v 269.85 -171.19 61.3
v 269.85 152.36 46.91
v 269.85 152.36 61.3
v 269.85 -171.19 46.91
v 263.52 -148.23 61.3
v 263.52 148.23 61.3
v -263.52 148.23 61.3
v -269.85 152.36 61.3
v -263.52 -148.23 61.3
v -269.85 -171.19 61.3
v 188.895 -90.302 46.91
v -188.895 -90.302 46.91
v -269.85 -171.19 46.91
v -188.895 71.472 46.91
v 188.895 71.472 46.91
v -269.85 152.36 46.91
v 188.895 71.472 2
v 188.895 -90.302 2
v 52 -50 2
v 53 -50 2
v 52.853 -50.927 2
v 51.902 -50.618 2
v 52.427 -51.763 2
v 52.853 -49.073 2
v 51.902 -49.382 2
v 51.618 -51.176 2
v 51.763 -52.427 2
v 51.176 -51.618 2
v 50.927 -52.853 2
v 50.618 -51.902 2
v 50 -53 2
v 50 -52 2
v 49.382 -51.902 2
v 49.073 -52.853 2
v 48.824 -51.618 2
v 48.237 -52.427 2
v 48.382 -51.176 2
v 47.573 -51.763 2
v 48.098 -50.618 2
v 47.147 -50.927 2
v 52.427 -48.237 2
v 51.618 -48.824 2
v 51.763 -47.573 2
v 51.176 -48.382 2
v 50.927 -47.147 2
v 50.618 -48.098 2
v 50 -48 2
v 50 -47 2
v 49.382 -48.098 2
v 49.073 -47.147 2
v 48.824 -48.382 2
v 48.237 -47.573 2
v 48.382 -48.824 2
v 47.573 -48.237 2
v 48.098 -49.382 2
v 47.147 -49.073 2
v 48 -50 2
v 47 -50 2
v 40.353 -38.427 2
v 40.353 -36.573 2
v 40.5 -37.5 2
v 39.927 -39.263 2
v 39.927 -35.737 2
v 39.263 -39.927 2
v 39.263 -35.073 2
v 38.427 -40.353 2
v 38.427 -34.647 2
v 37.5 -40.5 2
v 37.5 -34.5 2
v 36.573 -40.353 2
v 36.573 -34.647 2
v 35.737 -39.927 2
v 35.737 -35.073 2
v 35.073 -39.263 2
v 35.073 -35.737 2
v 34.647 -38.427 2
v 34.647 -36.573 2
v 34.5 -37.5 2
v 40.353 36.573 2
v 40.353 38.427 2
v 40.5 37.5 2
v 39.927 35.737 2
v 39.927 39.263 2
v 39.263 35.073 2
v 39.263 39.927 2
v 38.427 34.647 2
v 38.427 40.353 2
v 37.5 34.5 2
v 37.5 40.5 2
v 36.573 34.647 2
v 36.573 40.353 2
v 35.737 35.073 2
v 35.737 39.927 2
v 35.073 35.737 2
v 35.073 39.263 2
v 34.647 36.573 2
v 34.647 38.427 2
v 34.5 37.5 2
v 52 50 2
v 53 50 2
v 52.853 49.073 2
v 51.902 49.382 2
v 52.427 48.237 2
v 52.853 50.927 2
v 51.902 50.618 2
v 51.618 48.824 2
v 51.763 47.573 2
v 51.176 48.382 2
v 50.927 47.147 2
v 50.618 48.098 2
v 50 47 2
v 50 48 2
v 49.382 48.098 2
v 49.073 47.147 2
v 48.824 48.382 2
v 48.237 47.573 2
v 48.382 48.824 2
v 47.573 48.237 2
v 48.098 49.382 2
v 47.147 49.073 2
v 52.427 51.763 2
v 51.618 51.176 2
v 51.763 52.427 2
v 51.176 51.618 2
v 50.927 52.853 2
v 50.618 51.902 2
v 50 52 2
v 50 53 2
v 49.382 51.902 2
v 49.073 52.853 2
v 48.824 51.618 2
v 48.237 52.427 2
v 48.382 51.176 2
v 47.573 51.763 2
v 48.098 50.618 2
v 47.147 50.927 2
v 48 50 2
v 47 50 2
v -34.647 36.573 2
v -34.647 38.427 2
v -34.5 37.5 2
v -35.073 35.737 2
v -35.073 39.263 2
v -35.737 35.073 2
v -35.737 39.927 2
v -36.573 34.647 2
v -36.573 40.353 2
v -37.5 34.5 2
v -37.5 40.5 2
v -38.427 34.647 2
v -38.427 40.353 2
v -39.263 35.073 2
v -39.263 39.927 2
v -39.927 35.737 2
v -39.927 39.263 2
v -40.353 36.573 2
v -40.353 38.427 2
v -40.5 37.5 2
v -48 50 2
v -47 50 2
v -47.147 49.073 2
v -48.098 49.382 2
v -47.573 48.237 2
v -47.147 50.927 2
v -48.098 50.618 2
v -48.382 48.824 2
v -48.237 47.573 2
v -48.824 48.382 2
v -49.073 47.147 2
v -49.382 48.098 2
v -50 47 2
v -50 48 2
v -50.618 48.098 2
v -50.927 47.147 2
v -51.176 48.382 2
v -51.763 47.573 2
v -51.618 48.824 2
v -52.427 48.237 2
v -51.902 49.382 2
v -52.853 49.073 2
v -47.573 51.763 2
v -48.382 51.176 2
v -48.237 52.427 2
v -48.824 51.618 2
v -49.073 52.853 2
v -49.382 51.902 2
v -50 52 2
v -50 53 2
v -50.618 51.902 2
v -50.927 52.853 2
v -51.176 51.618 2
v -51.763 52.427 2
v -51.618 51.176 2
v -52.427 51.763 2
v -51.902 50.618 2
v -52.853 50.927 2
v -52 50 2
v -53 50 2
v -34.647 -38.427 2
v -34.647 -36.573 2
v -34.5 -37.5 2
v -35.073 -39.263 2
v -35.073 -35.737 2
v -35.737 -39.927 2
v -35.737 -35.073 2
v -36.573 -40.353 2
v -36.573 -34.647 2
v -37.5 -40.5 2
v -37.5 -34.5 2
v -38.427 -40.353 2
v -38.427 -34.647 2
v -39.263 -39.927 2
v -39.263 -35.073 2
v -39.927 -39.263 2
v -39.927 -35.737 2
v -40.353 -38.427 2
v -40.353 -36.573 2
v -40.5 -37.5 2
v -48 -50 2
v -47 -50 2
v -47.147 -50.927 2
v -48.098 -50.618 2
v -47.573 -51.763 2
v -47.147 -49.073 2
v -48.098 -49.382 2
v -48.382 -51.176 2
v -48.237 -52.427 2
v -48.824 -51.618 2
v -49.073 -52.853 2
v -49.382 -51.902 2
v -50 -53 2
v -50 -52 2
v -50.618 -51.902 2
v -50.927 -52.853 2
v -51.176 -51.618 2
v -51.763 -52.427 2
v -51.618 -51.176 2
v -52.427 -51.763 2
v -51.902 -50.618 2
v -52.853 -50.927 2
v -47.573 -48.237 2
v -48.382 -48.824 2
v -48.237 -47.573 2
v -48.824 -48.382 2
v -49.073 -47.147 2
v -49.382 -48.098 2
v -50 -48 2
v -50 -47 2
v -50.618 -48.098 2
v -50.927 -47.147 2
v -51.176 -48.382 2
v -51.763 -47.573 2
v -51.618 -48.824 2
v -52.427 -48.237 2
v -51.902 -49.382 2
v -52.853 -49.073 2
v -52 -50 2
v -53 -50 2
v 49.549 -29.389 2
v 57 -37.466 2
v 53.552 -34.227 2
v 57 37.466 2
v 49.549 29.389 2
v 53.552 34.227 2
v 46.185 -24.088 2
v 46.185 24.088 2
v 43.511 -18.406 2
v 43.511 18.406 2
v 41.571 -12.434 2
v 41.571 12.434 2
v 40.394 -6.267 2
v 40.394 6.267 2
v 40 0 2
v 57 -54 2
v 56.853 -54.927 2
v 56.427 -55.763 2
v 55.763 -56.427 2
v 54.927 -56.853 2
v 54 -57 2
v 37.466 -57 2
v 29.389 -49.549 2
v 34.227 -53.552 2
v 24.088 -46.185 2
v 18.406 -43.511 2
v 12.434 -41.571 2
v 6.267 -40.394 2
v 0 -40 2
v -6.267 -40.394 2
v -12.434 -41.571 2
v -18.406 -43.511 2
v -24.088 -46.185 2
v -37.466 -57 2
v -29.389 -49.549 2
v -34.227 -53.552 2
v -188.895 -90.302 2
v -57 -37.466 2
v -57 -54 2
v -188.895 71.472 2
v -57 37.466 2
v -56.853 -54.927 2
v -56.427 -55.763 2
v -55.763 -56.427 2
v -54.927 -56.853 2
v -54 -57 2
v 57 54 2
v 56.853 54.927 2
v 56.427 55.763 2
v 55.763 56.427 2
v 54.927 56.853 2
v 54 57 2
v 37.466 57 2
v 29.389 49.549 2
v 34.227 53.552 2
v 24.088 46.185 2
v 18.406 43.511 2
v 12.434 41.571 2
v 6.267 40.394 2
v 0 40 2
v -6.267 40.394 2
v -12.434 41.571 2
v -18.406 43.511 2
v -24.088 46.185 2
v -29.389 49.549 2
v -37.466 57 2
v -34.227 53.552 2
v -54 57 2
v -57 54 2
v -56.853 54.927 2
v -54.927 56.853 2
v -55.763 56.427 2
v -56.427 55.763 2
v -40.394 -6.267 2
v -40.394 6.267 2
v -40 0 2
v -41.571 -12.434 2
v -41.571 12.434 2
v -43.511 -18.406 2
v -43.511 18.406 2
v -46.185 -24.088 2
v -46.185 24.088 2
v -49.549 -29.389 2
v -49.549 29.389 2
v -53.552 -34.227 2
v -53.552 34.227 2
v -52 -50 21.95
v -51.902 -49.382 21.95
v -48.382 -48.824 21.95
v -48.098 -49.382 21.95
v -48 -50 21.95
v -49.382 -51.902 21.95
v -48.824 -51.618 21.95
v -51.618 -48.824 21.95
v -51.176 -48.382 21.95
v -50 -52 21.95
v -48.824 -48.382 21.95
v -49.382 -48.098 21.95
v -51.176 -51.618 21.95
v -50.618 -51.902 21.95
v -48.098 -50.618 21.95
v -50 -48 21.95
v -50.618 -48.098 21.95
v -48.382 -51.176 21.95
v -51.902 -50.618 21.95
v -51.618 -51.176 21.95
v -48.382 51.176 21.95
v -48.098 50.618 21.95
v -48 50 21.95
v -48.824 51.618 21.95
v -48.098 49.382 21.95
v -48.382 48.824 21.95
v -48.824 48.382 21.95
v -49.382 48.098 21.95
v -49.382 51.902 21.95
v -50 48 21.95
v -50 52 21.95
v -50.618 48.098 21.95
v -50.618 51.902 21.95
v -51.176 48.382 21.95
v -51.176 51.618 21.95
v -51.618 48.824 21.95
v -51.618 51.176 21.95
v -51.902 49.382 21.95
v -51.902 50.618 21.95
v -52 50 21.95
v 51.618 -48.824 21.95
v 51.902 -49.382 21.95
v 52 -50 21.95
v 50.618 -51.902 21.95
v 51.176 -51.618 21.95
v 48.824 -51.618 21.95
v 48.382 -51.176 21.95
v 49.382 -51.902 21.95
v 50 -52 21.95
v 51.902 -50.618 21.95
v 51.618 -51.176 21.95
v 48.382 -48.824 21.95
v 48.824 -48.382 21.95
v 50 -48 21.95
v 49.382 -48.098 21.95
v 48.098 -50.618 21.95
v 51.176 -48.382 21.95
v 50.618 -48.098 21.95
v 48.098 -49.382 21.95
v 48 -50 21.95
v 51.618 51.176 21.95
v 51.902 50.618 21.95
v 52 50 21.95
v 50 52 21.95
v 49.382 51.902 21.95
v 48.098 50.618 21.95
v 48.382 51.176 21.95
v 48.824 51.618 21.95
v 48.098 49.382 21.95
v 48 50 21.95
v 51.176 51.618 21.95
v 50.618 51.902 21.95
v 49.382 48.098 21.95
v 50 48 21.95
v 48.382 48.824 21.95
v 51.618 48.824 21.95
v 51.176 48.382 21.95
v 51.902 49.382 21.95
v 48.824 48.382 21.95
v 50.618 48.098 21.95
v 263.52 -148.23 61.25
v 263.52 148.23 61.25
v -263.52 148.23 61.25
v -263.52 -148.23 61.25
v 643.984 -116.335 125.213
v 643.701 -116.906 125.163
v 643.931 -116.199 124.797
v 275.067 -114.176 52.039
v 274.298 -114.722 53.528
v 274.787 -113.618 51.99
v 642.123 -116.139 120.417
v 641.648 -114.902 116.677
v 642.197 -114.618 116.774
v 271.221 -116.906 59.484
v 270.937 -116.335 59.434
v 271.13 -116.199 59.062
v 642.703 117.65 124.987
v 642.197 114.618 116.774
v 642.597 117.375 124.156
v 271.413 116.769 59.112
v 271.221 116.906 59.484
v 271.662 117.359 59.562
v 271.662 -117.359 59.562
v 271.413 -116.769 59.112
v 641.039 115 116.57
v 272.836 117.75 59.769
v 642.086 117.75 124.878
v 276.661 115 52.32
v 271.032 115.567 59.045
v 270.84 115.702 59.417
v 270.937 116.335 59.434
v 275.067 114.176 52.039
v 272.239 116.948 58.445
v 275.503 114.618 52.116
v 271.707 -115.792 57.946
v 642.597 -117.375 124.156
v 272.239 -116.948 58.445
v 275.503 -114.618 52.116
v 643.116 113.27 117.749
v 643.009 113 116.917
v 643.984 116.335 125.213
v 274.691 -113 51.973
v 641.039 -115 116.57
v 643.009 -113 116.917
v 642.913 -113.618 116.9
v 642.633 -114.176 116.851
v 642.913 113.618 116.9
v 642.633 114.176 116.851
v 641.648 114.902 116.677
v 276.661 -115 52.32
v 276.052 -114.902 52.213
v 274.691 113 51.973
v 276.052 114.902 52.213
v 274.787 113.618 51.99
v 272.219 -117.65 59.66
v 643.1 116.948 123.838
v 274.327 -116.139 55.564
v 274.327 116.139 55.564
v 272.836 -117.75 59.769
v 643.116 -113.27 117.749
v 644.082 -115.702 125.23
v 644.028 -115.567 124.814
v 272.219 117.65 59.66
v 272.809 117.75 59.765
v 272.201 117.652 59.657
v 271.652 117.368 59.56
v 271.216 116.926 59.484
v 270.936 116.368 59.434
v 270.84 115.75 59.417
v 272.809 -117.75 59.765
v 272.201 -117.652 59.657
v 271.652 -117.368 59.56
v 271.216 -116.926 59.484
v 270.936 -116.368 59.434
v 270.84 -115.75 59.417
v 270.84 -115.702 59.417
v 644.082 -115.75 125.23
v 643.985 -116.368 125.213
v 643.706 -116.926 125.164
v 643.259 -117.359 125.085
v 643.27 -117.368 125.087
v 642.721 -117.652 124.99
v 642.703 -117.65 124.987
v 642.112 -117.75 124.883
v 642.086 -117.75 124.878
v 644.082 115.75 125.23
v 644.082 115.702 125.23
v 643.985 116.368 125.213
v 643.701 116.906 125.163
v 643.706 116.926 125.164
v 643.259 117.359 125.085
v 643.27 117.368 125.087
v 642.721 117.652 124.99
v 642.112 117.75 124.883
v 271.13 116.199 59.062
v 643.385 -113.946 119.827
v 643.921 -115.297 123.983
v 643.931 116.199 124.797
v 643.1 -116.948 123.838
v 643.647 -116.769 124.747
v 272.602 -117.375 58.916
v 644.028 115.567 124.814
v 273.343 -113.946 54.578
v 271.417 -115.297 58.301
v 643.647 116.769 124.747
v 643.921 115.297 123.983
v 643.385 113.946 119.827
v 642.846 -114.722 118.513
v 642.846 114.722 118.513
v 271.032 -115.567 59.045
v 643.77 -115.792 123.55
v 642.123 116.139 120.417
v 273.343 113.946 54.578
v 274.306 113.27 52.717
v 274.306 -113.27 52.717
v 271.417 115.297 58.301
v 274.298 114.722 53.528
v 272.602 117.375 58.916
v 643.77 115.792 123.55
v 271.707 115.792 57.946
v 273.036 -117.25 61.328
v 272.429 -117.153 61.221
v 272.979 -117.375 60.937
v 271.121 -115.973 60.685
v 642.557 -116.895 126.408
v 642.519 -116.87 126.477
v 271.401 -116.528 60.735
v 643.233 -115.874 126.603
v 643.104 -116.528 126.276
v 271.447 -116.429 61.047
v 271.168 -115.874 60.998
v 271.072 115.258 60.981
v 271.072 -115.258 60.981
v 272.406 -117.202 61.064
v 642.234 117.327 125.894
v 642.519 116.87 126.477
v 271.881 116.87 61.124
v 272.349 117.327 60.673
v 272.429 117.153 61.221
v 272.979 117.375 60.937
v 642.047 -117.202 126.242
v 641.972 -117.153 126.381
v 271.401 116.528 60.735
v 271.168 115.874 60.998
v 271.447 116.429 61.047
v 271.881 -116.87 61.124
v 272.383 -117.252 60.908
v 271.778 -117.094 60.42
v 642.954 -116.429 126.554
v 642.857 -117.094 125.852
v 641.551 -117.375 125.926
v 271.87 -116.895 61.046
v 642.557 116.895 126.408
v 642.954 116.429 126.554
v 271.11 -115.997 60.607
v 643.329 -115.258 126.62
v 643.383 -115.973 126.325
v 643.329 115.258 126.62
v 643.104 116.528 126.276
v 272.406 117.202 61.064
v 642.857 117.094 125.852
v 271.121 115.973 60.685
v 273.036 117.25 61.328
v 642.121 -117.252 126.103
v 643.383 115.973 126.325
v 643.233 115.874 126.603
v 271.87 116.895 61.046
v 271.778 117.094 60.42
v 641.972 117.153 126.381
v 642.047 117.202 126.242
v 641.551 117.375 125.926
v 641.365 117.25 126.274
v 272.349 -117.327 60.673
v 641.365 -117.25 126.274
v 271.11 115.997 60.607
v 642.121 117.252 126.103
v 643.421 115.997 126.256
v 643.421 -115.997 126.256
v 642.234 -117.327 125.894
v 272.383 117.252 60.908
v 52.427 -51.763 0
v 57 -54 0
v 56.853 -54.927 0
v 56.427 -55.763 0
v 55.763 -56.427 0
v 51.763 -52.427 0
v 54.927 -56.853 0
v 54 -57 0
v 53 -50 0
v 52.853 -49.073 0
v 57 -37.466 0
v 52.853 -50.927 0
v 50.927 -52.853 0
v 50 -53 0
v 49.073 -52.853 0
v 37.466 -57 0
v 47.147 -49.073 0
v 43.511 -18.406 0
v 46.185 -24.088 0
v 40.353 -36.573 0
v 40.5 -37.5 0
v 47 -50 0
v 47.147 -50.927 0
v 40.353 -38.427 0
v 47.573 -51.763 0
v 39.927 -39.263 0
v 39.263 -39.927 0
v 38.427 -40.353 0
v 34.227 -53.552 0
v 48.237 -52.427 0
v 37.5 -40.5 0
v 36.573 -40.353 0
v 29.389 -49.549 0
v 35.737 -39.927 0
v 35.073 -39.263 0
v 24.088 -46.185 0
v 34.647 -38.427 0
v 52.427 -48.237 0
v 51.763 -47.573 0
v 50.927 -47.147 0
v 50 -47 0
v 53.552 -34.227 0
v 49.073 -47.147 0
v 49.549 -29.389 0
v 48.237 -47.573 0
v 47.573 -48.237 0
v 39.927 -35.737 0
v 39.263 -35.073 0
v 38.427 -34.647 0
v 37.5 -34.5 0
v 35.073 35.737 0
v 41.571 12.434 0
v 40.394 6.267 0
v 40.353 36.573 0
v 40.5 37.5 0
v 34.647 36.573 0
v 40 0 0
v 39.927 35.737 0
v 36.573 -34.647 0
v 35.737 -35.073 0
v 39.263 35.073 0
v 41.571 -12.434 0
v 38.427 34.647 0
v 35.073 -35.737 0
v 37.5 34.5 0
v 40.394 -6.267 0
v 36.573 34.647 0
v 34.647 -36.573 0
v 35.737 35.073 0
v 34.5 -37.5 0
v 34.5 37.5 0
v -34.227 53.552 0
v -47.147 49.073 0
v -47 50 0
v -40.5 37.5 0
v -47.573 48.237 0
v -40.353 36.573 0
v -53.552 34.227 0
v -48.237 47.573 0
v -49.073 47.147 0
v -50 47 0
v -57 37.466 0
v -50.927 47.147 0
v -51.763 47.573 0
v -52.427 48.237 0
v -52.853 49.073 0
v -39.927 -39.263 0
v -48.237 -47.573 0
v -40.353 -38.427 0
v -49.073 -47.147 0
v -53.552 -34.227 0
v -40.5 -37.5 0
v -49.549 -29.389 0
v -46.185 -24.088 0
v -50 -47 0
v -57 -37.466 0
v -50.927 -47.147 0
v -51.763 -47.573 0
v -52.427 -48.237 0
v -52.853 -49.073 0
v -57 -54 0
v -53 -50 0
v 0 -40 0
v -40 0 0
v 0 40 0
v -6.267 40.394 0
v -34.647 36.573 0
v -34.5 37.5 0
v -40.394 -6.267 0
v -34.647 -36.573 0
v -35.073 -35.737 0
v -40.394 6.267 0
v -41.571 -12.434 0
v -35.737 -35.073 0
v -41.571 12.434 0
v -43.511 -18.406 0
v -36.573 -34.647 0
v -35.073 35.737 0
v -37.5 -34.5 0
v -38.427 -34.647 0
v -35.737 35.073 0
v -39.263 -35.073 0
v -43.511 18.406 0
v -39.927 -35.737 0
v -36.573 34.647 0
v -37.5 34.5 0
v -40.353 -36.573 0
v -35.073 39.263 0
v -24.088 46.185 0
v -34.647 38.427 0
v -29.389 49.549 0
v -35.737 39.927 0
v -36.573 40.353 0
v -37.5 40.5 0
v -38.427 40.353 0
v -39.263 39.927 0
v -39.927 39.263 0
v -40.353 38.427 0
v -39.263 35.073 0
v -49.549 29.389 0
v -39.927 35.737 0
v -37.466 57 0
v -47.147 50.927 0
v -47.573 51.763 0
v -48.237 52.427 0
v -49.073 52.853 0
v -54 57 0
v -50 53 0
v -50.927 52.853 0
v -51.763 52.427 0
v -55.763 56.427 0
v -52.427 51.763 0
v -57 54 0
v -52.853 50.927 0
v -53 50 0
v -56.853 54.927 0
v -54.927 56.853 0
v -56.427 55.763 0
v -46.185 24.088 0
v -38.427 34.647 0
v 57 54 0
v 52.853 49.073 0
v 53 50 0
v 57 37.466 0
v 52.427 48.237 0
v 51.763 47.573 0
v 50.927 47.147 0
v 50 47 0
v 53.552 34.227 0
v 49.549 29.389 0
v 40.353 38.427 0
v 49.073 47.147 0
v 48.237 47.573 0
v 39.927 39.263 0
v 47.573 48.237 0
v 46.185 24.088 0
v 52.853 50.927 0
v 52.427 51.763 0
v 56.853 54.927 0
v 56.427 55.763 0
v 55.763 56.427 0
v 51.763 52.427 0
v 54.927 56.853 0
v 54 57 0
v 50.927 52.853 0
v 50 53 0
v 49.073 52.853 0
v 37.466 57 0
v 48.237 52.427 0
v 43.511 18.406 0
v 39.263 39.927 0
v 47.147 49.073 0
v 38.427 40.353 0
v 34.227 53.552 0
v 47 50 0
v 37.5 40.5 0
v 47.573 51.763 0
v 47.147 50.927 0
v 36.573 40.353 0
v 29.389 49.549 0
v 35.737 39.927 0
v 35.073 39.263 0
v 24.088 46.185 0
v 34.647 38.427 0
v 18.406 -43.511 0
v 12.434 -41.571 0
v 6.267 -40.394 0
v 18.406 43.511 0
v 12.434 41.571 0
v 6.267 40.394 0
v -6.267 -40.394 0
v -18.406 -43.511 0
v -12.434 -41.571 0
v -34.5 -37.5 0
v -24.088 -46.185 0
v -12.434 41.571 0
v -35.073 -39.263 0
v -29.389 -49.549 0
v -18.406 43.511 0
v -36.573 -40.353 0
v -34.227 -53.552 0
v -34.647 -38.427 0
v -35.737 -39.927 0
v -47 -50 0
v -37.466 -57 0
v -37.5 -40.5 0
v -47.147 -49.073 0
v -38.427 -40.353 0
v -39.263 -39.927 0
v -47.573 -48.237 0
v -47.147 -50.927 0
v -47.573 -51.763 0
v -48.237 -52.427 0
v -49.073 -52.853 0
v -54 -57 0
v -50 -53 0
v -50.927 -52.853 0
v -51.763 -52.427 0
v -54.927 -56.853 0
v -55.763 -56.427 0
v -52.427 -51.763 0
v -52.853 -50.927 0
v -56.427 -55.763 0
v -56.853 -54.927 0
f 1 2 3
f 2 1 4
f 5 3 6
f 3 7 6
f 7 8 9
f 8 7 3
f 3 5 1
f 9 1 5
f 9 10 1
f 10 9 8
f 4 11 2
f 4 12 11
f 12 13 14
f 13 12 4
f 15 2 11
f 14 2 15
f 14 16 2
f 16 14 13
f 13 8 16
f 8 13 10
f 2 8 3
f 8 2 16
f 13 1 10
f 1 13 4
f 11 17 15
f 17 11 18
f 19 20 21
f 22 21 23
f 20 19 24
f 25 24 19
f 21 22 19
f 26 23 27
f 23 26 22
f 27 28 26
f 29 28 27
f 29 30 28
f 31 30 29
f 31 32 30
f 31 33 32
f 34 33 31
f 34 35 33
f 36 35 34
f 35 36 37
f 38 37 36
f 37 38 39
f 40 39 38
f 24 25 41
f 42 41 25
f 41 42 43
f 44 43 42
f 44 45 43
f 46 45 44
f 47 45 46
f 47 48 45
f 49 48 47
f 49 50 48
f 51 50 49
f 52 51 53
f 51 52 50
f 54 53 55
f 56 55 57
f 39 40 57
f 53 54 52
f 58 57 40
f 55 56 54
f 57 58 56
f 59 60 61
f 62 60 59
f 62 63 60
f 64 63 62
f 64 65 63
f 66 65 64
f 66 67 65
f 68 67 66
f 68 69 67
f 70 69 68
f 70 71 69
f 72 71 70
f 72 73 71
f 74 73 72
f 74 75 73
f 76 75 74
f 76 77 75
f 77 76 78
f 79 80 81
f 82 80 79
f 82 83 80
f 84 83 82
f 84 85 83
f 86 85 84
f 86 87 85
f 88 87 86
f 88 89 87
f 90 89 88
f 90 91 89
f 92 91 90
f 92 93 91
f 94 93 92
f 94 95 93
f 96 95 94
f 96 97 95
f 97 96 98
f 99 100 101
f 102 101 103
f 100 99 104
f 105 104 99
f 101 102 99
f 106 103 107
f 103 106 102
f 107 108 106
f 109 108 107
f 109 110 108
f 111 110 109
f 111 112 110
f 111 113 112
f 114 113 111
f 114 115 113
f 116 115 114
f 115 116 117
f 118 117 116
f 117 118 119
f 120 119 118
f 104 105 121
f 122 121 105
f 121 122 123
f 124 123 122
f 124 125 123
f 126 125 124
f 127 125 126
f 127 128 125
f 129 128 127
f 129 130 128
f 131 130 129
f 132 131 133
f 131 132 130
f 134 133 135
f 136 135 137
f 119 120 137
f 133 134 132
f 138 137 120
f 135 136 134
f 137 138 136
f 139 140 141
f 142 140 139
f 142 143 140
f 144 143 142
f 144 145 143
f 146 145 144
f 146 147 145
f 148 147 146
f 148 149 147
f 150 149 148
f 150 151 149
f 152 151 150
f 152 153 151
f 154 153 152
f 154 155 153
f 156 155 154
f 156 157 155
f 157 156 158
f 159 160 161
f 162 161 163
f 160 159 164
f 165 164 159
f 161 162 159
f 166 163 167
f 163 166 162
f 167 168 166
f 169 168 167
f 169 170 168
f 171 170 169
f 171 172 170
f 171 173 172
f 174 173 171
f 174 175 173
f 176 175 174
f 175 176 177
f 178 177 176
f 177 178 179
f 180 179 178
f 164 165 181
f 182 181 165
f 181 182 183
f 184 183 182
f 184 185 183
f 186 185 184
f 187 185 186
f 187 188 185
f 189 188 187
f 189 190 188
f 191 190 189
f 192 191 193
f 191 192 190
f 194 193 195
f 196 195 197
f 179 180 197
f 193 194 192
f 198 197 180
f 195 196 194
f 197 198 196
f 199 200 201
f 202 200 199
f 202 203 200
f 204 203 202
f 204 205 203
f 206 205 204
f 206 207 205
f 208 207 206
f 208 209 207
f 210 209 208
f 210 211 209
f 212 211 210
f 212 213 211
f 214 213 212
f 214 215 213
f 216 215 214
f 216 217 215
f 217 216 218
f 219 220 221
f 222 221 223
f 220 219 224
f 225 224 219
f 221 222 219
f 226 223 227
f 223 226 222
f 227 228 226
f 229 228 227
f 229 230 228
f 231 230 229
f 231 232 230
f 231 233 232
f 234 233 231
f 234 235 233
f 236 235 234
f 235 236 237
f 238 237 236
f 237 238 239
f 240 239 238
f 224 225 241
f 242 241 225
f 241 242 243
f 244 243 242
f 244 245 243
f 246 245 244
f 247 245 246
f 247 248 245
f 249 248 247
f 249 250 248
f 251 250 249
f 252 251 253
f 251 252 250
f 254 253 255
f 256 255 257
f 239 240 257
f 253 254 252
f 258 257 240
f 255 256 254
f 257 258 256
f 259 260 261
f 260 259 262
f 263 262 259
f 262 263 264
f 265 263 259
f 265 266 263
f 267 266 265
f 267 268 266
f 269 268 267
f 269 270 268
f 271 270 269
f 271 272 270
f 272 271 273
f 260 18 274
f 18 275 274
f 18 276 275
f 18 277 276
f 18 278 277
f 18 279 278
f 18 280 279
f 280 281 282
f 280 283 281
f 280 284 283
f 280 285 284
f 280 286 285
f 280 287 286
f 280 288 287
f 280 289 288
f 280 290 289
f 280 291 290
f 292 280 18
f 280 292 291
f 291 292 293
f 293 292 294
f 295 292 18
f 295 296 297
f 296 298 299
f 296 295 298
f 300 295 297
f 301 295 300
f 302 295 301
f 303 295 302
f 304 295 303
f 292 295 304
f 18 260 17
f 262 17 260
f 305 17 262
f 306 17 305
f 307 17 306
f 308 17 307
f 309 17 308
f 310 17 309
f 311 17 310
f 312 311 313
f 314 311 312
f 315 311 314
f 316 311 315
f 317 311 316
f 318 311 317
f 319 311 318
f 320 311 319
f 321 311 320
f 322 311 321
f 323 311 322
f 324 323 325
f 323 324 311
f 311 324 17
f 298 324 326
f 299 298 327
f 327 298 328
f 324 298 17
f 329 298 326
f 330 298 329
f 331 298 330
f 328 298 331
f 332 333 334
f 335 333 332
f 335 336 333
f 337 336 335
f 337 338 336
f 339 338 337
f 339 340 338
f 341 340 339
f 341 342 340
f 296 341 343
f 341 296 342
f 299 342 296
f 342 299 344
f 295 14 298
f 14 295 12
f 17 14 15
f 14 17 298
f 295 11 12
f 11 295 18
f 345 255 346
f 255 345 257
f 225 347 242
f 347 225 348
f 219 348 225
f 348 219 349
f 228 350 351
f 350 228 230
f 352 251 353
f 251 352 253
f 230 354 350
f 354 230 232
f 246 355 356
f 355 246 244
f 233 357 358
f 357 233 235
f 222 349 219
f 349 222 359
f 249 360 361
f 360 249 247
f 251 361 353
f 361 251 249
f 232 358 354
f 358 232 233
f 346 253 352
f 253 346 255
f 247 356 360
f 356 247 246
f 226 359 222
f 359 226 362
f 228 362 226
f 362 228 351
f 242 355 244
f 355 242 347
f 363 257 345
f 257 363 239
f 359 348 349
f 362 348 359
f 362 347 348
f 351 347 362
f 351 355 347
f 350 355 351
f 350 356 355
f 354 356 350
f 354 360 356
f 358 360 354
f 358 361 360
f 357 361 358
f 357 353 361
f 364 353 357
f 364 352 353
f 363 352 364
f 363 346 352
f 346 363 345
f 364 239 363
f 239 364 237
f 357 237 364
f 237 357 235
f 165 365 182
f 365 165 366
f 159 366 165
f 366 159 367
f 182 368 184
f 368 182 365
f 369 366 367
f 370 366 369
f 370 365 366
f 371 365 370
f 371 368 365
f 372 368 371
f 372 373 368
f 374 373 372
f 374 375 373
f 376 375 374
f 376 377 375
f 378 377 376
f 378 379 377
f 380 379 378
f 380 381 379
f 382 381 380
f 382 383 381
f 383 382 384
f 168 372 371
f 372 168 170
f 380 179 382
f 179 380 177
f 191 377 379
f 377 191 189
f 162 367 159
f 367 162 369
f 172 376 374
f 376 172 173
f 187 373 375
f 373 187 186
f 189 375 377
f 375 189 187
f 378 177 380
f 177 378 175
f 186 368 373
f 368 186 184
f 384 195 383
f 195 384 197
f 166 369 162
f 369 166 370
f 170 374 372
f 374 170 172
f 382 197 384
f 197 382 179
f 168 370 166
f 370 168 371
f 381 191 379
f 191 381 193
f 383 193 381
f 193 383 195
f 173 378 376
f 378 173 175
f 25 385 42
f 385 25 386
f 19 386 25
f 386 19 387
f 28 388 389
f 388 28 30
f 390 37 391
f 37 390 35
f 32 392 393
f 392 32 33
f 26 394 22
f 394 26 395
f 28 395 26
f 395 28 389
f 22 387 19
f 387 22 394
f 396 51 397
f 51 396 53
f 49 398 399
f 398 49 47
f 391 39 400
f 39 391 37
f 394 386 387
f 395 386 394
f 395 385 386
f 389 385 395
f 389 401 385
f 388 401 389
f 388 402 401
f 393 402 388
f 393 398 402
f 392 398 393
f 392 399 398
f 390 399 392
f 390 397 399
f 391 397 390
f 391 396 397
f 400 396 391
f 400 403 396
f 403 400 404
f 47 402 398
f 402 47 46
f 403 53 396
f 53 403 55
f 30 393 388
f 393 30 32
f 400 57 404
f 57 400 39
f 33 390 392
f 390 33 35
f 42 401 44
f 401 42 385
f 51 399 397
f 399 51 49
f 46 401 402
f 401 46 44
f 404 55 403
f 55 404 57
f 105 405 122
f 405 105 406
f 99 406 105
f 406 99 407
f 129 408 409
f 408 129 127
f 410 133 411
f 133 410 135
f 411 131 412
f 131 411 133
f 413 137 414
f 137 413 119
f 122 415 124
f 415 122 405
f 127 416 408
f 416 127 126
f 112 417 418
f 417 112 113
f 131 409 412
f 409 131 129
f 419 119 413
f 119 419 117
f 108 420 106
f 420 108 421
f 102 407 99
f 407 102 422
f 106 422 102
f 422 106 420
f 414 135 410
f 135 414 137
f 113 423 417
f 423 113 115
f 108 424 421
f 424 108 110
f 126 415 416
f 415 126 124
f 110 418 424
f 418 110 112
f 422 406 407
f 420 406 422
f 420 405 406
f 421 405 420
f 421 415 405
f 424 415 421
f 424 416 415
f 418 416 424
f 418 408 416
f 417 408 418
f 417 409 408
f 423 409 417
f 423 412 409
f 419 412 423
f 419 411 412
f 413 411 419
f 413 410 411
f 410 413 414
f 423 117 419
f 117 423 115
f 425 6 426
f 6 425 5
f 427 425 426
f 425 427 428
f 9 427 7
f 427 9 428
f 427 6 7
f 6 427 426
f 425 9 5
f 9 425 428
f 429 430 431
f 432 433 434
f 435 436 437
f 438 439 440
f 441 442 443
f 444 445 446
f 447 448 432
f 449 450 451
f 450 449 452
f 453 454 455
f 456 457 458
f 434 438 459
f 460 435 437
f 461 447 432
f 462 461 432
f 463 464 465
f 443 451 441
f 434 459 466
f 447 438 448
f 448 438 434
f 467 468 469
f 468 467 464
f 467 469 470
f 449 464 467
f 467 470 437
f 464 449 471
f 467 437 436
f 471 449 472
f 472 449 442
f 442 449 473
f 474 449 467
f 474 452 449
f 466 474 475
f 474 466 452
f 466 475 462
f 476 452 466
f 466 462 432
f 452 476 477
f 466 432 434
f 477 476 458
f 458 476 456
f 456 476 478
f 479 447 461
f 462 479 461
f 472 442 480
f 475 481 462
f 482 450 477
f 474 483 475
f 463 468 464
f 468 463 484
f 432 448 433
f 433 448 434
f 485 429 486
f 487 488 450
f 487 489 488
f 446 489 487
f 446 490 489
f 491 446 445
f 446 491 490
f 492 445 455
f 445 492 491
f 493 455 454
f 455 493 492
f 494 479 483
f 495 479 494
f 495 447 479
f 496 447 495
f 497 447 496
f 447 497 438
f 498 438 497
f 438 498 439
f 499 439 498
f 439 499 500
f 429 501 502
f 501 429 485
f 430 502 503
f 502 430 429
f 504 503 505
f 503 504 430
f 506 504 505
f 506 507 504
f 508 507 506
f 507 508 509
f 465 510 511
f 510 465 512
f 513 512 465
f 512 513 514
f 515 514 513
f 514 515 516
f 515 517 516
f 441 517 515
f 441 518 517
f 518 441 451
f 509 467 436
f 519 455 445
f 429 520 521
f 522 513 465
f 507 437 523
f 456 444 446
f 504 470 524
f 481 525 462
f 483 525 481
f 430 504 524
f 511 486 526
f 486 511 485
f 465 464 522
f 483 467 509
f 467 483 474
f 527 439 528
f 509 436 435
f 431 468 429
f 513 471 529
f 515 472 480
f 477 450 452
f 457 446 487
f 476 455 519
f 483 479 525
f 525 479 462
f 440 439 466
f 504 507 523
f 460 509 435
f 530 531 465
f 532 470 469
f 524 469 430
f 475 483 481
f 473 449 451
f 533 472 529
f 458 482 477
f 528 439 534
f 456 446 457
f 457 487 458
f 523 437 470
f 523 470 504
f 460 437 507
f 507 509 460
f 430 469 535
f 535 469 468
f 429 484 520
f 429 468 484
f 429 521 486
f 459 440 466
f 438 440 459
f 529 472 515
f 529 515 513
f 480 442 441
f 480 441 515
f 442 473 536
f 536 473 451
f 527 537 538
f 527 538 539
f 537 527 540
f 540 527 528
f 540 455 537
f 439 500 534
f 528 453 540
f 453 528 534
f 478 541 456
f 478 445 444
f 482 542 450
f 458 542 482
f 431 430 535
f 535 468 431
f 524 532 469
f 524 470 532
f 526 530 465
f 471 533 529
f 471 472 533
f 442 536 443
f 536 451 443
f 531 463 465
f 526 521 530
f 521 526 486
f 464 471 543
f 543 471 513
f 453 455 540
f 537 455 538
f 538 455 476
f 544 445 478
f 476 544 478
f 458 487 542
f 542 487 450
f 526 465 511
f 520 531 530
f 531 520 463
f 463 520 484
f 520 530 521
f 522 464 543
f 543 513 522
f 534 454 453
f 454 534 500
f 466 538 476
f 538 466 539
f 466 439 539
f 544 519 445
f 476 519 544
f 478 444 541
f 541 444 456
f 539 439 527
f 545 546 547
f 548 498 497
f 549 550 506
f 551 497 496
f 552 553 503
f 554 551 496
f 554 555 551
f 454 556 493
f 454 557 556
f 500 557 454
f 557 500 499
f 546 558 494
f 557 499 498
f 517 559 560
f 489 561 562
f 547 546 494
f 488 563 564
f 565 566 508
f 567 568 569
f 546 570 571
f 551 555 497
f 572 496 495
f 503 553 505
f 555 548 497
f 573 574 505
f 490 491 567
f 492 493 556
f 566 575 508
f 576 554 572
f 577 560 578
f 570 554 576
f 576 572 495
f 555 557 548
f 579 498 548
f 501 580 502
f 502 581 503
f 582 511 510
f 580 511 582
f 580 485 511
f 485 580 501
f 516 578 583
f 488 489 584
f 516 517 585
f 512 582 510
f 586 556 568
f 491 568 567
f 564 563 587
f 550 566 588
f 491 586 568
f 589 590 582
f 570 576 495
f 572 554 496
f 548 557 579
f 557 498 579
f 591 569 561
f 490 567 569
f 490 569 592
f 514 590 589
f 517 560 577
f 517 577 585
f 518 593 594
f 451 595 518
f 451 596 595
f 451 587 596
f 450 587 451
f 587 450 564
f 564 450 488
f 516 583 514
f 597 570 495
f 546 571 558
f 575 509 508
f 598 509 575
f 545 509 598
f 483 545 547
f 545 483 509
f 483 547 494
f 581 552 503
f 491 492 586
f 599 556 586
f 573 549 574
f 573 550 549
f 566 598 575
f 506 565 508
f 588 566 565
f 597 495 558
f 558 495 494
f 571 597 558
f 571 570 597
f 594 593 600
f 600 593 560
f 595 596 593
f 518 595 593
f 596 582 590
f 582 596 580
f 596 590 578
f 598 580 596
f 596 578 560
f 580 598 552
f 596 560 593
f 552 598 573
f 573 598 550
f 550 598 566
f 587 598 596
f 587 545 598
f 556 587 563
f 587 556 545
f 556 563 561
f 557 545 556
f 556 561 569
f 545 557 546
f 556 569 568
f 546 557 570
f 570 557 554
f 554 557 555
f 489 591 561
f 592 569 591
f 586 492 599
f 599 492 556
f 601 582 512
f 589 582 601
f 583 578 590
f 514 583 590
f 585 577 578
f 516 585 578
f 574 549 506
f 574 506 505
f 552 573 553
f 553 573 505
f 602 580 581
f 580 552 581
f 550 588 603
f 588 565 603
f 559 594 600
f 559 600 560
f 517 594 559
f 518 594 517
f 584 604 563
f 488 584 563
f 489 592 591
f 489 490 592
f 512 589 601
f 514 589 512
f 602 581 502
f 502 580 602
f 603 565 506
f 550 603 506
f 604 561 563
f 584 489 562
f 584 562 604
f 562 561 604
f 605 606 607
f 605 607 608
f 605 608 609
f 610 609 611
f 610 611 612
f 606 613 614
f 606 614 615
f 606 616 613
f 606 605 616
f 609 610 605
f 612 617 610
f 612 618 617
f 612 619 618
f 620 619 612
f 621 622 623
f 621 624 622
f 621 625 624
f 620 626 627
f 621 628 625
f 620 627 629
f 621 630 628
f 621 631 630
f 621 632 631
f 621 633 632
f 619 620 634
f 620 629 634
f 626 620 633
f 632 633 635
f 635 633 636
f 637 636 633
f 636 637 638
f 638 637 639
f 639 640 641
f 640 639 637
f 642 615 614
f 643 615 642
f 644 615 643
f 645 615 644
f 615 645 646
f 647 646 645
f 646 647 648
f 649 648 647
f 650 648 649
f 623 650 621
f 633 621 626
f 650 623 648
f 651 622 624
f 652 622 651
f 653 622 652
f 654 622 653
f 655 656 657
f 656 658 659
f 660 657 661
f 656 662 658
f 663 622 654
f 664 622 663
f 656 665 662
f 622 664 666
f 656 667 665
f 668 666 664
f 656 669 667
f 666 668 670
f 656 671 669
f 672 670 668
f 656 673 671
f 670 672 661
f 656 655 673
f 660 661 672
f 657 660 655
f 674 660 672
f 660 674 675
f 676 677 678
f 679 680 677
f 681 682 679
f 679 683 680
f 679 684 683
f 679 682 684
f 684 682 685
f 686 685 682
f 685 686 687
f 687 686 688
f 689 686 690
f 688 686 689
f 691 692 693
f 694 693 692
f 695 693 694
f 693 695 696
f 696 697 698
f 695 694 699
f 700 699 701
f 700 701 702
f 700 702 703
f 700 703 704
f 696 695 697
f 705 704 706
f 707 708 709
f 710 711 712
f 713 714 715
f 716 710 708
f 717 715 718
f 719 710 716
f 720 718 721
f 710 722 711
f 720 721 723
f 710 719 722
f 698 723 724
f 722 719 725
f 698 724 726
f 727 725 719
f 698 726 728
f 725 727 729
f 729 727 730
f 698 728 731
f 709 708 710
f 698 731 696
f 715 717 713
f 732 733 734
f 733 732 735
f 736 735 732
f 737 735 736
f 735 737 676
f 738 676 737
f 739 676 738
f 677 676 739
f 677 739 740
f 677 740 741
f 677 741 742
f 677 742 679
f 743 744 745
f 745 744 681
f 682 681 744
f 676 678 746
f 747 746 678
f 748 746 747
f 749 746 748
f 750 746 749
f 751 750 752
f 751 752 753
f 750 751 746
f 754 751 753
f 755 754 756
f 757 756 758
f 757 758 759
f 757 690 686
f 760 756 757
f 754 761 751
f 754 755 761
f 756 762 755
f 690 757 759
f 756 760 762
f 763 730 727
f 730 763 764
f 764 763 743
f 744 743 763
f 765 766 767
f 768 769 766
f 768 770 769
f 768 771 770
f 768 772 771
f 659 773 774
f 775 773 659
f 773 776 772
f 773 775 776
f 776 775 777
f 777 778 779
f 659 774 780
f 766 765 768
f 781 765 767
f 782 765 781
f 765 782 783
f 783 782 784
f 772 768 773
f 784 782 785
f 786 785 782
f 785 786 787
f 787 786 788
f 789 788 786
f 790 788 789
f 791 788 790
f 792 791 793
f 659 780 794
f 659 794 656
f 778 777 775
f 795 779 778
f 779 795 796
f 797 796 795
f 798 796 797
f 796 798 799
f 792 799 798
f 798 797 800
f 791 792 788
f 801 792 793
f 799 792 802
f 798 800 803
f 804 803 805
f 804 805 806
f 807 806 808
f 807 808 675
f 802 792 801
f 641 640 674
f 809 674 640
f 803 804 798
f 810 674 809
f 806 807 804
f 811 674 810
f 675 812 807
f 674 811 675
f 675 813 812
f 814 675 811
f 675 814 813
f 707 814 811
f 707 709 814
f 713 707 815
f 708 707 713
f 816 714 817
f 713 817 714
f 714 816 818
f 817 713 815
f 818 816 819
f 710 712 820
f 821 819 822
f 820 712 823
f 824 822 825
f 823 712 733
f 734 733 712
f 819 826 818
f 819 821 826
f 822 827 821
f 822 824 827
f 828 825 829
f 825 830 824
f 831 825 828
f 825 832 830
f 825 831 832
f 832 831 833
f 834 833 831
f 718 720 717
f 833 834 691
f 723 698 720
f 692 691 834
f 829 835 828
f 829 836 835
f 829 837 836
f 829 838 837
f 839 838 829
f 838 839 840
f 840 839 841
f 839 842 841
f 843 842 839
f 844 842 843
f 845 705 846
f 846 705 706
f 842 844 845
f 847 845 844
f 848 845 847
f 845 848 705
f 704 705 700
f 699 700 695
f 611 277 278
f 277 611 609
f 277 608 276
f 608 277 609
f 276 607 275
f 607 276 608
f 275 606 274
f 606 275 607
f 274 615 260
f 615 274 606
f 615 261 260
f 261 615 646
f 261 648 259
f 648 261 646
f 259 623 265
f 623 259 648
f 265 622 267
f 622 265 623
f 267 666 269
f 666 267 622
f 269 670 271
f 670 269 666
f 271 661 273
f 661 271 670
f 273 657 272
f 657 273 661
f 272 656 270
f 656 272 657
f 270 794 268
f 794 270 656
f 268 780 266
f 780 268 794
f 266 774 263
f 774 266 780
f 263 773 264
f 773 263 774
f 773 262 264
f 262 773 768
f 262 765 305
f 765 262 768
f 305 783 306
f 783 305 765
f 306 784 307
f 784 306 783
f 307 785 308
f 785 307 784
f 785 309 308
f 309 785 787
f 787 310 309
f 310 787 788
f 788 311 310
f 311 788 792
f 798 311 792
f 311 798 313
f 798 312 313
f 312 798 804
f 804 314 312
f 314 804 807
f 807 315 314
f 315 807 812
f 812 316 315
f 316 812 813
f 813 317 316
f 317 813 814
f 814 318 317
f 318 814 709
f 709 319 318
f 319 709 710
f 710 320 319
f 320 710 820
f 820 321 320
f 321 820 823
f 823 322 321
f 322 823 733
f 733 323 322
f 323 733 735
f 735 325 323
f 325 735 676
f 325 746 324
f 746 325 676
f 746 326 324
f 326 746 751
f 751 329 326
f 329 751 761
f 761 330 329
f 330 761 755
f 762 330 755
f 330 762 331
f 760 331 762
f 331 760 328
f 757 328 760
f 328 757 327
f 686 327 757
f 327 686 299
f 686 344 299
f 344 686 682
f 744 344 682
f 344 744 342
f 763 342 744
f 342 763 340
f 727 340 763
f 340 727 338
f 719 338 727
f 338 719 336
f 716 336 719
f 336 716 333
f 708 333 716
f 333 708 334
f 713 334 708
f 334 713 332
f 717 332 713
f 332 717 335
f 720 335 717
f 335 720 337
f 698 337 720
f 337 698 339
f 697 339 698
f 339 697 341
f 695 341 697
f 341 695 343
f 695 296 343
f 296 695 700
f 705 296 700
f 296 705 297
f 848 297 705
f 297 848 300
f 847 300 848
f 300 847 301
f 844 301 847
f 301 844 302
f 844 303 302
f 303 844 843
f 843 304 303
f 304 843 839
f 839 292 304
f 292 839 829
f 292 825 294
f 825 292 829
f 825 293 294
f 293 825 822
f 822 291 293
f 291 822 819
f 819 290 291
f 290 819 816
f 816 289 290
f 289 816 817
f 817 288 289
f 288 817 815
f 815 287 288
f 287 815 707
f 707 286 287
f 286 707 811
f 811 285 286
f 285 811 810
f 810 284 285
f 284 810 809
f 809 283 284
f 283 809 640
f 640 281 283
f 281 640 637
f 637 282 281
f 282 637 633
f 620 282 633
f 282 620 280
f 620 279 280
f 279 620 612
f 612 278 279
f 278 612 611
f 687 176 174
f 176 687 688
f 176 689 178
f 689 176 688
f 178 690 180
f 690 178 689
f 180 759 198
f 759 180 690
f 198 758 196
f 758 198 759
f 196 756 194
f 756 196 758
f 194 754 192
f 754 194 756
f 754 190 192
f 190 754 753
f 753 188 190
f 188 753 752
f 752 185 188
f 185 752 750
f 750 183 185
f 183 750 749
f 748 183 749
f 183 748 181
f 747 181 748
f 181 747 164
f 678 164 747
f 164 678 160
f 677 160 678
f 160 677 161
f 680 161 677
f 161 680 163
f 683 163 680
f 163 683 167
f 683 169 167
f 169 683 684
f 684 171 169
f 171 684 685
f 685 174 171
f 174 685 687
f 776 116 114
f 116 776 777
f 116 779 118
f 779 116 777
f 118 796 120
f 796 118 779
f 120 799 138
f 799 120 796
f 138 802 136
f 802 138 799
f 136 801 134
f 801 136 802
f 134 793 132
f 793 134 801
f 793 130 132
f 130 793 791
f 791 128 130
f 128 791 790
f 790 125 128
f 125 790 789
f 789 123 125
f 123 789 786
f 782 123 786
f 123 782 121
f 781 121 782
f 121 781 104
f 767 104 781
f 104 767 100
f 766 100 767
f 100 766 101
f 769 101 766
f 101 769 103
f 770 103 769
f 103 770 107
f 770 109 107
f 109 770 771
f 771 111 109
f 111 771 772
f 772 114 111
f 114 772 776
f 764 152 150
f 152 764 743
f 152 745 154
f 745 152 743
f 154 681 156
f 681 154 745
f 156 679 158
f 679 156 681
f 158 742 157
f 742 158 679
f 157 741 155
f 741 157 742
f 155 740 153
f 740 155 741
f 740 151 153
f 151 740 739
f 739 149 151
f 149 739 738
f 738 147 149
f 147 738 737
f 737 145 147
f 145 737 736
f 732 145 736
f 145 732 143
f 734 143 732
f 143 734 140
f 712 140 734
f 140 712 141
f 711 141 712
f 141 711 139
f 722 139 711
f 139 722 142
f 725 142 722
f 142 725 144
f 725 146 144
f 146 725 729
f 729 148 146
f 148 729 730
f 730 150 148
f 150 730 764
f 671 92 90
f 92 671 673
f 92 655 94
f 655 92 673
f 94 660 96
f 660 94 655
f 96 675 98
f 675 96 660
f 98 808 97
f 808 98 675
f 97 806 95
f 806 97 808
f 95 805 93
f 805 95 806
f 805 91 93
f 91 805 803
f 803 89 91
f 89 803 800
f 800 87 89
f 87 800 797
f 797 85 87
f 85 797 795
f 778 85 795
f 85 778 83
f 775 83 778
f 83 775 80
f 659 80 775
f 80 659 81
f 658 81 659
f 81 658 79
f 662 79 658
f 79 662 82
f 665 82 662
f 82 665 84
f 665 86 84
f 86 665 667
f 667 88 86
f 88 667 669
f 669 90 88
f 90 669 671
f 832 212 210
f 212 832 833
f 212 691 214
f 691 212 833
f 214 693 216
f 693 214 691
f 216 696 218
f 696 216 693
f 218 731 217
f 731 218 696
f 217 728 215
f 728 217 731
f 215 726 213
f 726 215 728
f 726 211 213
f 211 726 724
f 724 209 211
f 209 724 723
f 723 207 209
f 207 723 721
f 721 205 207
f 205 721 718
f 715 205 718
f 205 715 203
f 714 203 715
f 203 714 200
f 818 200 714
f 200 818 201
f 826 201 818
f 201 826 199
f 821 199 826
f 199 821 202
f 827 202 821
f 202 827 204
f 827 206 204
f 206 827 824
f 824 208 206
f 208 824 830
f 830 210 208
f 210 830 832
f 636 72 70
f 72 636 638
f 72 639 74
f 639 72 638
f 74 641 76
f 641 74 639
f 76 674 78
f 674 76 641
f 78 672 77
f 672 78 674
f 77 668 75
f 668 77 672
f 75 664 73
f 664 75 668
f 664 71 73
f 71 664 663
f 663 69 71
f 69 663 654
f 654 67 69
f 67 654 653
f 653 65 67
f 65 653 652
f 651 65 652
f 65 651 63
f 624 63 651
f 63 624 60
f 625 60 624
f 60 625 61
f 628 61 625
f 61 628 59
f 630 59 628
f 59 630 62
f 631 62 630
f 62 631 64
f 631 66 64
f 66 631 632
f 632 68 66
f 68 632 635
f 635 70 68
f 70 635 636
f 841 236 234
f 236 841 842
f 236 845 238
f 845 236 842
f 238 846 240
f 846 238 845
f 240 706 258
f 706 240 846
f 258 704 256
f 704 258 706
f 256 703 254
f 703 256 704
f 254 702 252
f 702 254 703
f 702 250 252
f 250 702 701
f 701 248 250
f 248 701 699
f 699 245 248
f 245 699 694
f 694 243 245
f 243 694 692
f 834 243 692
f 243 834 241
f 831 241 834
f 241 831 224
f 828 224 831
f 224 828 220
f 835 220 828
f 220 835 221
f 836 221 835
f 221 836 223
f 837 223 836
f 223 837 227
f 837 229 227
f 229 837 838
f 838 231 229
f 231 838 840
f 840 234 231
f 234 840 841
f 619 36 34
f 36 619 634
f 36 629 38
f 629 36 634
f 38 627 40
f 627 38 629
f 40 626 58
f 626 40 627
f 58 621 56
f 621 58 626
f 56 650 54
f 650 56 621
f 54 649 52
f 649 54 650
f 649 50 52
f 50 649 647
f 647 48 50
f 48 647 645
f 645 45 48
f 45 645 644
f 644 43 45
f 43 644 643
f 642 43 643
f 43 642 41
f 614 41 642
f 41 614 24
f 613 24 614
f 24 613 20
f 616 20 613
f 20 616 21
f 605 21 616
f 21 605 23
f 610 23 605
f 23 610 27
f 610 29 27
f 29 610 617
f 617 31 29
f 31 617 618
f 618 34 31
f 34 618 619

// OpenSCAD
$fn=20;

/* [Dimensions] */
extrusionWidth=0.4;
walls=4;
maxThickness=14;

/* [Hidden] */
minWallThck=extrusionWidth*walls;
fudge=0.1;

VESAAdapter();
translate([0,0,2]) asusVA24D();
translate([270,0,61.3]) rotate([0,-10,0]) translate([190,0,-10]) USBMon();

module VESAAdapter(){
  plateDims=[120,120,2];
  drillDia=6;
  rad=6;
  cutOutRad=50;
  cutOutDist=cutOutRad*2+80; //distance between cutout circles
  
  linear_extrude(plateDims.z) difference(){
    hull() for (ix=[-1,1],iy=[-1,1])
      translate([ix*(plateDims.x/2-rad),iy*(plateDims.y/2-rad)]) circle(d=drillDia);
    for (ix=[-1,1],iy=[-1,1]){
      translate([ix*100/2,iy*100/2]) circle(d=6);
      translate([ix*75/2,iy*75/2]) circle(d=6);
    }
    for (ir=[0:90:270])
      rotate(ir) translate([cutOutDist/2,0]) circle(cutOutRad,$fn=50);
  }  
}

module USBMon(){
  backDim=[196+178,230];
  midDim=[192+187,235.5,8];
  frontDim=midDim-[1,1,6.5];
  backRad=2;
  midRad=(midDim.x-backDim.x)/2;
  sclMid=[midDim.x/backDim.x,midDim.y/backDim.y];
  sclFrnt=[frontDim.x/midDim.x,frontDim.y/midDim.y];
  
  linear_extrude(height=midDim.z,scale=sclMid) hull() for (ix=[-1,1],iy=[-1,1])
    translate([ix*(backDim.x/2-backRad),iy*(backDim.y/2-backRad)]) circle(backRad);
  translate([0,0,midDim.z]) linear_extrude(height=frontDim.z,scale=sclFrnt) 
    hull() for (ix=[-1,1],iy=[-1,1])
      translate([ix*(midDim.x/2-backRad),iy*(midDim.y/2-backRad)]) circle(backRad);
}

module asusVA24D(){
  //dummy of asus monitor
  ovDims=[539.7,323.55,59.30];
  bezelThck=14.39;
  AADims=[527.04,296.46]; //active area
  AAcntrPos=[0,18.83/2];

  difference(){
    color("darkSlateGrey") translate([0,-AAcntrPos.y,0]) union(){
      translate([0,0,-bezelThck/2+ovDims.z]) cube([ovDims.x,ovDims.y,bezelThck],true);
      translate([0,0,(ovDims.z-bezelThck)/2]) cube([ovDims.x*0.7,ovDims.y*0.5,ovDims.z-bezelThck],true);
    }
      for (ix=[-1,1],iy=[-1,1])
        translate([ix*100/2,iy*100/2,-fudge/2]) cylinder(d=4,h=20);
      color("grey") translate([0,0,ovDims.z]) cube([AADims.x,AADims.y,fudge],true);
    }
  
}
